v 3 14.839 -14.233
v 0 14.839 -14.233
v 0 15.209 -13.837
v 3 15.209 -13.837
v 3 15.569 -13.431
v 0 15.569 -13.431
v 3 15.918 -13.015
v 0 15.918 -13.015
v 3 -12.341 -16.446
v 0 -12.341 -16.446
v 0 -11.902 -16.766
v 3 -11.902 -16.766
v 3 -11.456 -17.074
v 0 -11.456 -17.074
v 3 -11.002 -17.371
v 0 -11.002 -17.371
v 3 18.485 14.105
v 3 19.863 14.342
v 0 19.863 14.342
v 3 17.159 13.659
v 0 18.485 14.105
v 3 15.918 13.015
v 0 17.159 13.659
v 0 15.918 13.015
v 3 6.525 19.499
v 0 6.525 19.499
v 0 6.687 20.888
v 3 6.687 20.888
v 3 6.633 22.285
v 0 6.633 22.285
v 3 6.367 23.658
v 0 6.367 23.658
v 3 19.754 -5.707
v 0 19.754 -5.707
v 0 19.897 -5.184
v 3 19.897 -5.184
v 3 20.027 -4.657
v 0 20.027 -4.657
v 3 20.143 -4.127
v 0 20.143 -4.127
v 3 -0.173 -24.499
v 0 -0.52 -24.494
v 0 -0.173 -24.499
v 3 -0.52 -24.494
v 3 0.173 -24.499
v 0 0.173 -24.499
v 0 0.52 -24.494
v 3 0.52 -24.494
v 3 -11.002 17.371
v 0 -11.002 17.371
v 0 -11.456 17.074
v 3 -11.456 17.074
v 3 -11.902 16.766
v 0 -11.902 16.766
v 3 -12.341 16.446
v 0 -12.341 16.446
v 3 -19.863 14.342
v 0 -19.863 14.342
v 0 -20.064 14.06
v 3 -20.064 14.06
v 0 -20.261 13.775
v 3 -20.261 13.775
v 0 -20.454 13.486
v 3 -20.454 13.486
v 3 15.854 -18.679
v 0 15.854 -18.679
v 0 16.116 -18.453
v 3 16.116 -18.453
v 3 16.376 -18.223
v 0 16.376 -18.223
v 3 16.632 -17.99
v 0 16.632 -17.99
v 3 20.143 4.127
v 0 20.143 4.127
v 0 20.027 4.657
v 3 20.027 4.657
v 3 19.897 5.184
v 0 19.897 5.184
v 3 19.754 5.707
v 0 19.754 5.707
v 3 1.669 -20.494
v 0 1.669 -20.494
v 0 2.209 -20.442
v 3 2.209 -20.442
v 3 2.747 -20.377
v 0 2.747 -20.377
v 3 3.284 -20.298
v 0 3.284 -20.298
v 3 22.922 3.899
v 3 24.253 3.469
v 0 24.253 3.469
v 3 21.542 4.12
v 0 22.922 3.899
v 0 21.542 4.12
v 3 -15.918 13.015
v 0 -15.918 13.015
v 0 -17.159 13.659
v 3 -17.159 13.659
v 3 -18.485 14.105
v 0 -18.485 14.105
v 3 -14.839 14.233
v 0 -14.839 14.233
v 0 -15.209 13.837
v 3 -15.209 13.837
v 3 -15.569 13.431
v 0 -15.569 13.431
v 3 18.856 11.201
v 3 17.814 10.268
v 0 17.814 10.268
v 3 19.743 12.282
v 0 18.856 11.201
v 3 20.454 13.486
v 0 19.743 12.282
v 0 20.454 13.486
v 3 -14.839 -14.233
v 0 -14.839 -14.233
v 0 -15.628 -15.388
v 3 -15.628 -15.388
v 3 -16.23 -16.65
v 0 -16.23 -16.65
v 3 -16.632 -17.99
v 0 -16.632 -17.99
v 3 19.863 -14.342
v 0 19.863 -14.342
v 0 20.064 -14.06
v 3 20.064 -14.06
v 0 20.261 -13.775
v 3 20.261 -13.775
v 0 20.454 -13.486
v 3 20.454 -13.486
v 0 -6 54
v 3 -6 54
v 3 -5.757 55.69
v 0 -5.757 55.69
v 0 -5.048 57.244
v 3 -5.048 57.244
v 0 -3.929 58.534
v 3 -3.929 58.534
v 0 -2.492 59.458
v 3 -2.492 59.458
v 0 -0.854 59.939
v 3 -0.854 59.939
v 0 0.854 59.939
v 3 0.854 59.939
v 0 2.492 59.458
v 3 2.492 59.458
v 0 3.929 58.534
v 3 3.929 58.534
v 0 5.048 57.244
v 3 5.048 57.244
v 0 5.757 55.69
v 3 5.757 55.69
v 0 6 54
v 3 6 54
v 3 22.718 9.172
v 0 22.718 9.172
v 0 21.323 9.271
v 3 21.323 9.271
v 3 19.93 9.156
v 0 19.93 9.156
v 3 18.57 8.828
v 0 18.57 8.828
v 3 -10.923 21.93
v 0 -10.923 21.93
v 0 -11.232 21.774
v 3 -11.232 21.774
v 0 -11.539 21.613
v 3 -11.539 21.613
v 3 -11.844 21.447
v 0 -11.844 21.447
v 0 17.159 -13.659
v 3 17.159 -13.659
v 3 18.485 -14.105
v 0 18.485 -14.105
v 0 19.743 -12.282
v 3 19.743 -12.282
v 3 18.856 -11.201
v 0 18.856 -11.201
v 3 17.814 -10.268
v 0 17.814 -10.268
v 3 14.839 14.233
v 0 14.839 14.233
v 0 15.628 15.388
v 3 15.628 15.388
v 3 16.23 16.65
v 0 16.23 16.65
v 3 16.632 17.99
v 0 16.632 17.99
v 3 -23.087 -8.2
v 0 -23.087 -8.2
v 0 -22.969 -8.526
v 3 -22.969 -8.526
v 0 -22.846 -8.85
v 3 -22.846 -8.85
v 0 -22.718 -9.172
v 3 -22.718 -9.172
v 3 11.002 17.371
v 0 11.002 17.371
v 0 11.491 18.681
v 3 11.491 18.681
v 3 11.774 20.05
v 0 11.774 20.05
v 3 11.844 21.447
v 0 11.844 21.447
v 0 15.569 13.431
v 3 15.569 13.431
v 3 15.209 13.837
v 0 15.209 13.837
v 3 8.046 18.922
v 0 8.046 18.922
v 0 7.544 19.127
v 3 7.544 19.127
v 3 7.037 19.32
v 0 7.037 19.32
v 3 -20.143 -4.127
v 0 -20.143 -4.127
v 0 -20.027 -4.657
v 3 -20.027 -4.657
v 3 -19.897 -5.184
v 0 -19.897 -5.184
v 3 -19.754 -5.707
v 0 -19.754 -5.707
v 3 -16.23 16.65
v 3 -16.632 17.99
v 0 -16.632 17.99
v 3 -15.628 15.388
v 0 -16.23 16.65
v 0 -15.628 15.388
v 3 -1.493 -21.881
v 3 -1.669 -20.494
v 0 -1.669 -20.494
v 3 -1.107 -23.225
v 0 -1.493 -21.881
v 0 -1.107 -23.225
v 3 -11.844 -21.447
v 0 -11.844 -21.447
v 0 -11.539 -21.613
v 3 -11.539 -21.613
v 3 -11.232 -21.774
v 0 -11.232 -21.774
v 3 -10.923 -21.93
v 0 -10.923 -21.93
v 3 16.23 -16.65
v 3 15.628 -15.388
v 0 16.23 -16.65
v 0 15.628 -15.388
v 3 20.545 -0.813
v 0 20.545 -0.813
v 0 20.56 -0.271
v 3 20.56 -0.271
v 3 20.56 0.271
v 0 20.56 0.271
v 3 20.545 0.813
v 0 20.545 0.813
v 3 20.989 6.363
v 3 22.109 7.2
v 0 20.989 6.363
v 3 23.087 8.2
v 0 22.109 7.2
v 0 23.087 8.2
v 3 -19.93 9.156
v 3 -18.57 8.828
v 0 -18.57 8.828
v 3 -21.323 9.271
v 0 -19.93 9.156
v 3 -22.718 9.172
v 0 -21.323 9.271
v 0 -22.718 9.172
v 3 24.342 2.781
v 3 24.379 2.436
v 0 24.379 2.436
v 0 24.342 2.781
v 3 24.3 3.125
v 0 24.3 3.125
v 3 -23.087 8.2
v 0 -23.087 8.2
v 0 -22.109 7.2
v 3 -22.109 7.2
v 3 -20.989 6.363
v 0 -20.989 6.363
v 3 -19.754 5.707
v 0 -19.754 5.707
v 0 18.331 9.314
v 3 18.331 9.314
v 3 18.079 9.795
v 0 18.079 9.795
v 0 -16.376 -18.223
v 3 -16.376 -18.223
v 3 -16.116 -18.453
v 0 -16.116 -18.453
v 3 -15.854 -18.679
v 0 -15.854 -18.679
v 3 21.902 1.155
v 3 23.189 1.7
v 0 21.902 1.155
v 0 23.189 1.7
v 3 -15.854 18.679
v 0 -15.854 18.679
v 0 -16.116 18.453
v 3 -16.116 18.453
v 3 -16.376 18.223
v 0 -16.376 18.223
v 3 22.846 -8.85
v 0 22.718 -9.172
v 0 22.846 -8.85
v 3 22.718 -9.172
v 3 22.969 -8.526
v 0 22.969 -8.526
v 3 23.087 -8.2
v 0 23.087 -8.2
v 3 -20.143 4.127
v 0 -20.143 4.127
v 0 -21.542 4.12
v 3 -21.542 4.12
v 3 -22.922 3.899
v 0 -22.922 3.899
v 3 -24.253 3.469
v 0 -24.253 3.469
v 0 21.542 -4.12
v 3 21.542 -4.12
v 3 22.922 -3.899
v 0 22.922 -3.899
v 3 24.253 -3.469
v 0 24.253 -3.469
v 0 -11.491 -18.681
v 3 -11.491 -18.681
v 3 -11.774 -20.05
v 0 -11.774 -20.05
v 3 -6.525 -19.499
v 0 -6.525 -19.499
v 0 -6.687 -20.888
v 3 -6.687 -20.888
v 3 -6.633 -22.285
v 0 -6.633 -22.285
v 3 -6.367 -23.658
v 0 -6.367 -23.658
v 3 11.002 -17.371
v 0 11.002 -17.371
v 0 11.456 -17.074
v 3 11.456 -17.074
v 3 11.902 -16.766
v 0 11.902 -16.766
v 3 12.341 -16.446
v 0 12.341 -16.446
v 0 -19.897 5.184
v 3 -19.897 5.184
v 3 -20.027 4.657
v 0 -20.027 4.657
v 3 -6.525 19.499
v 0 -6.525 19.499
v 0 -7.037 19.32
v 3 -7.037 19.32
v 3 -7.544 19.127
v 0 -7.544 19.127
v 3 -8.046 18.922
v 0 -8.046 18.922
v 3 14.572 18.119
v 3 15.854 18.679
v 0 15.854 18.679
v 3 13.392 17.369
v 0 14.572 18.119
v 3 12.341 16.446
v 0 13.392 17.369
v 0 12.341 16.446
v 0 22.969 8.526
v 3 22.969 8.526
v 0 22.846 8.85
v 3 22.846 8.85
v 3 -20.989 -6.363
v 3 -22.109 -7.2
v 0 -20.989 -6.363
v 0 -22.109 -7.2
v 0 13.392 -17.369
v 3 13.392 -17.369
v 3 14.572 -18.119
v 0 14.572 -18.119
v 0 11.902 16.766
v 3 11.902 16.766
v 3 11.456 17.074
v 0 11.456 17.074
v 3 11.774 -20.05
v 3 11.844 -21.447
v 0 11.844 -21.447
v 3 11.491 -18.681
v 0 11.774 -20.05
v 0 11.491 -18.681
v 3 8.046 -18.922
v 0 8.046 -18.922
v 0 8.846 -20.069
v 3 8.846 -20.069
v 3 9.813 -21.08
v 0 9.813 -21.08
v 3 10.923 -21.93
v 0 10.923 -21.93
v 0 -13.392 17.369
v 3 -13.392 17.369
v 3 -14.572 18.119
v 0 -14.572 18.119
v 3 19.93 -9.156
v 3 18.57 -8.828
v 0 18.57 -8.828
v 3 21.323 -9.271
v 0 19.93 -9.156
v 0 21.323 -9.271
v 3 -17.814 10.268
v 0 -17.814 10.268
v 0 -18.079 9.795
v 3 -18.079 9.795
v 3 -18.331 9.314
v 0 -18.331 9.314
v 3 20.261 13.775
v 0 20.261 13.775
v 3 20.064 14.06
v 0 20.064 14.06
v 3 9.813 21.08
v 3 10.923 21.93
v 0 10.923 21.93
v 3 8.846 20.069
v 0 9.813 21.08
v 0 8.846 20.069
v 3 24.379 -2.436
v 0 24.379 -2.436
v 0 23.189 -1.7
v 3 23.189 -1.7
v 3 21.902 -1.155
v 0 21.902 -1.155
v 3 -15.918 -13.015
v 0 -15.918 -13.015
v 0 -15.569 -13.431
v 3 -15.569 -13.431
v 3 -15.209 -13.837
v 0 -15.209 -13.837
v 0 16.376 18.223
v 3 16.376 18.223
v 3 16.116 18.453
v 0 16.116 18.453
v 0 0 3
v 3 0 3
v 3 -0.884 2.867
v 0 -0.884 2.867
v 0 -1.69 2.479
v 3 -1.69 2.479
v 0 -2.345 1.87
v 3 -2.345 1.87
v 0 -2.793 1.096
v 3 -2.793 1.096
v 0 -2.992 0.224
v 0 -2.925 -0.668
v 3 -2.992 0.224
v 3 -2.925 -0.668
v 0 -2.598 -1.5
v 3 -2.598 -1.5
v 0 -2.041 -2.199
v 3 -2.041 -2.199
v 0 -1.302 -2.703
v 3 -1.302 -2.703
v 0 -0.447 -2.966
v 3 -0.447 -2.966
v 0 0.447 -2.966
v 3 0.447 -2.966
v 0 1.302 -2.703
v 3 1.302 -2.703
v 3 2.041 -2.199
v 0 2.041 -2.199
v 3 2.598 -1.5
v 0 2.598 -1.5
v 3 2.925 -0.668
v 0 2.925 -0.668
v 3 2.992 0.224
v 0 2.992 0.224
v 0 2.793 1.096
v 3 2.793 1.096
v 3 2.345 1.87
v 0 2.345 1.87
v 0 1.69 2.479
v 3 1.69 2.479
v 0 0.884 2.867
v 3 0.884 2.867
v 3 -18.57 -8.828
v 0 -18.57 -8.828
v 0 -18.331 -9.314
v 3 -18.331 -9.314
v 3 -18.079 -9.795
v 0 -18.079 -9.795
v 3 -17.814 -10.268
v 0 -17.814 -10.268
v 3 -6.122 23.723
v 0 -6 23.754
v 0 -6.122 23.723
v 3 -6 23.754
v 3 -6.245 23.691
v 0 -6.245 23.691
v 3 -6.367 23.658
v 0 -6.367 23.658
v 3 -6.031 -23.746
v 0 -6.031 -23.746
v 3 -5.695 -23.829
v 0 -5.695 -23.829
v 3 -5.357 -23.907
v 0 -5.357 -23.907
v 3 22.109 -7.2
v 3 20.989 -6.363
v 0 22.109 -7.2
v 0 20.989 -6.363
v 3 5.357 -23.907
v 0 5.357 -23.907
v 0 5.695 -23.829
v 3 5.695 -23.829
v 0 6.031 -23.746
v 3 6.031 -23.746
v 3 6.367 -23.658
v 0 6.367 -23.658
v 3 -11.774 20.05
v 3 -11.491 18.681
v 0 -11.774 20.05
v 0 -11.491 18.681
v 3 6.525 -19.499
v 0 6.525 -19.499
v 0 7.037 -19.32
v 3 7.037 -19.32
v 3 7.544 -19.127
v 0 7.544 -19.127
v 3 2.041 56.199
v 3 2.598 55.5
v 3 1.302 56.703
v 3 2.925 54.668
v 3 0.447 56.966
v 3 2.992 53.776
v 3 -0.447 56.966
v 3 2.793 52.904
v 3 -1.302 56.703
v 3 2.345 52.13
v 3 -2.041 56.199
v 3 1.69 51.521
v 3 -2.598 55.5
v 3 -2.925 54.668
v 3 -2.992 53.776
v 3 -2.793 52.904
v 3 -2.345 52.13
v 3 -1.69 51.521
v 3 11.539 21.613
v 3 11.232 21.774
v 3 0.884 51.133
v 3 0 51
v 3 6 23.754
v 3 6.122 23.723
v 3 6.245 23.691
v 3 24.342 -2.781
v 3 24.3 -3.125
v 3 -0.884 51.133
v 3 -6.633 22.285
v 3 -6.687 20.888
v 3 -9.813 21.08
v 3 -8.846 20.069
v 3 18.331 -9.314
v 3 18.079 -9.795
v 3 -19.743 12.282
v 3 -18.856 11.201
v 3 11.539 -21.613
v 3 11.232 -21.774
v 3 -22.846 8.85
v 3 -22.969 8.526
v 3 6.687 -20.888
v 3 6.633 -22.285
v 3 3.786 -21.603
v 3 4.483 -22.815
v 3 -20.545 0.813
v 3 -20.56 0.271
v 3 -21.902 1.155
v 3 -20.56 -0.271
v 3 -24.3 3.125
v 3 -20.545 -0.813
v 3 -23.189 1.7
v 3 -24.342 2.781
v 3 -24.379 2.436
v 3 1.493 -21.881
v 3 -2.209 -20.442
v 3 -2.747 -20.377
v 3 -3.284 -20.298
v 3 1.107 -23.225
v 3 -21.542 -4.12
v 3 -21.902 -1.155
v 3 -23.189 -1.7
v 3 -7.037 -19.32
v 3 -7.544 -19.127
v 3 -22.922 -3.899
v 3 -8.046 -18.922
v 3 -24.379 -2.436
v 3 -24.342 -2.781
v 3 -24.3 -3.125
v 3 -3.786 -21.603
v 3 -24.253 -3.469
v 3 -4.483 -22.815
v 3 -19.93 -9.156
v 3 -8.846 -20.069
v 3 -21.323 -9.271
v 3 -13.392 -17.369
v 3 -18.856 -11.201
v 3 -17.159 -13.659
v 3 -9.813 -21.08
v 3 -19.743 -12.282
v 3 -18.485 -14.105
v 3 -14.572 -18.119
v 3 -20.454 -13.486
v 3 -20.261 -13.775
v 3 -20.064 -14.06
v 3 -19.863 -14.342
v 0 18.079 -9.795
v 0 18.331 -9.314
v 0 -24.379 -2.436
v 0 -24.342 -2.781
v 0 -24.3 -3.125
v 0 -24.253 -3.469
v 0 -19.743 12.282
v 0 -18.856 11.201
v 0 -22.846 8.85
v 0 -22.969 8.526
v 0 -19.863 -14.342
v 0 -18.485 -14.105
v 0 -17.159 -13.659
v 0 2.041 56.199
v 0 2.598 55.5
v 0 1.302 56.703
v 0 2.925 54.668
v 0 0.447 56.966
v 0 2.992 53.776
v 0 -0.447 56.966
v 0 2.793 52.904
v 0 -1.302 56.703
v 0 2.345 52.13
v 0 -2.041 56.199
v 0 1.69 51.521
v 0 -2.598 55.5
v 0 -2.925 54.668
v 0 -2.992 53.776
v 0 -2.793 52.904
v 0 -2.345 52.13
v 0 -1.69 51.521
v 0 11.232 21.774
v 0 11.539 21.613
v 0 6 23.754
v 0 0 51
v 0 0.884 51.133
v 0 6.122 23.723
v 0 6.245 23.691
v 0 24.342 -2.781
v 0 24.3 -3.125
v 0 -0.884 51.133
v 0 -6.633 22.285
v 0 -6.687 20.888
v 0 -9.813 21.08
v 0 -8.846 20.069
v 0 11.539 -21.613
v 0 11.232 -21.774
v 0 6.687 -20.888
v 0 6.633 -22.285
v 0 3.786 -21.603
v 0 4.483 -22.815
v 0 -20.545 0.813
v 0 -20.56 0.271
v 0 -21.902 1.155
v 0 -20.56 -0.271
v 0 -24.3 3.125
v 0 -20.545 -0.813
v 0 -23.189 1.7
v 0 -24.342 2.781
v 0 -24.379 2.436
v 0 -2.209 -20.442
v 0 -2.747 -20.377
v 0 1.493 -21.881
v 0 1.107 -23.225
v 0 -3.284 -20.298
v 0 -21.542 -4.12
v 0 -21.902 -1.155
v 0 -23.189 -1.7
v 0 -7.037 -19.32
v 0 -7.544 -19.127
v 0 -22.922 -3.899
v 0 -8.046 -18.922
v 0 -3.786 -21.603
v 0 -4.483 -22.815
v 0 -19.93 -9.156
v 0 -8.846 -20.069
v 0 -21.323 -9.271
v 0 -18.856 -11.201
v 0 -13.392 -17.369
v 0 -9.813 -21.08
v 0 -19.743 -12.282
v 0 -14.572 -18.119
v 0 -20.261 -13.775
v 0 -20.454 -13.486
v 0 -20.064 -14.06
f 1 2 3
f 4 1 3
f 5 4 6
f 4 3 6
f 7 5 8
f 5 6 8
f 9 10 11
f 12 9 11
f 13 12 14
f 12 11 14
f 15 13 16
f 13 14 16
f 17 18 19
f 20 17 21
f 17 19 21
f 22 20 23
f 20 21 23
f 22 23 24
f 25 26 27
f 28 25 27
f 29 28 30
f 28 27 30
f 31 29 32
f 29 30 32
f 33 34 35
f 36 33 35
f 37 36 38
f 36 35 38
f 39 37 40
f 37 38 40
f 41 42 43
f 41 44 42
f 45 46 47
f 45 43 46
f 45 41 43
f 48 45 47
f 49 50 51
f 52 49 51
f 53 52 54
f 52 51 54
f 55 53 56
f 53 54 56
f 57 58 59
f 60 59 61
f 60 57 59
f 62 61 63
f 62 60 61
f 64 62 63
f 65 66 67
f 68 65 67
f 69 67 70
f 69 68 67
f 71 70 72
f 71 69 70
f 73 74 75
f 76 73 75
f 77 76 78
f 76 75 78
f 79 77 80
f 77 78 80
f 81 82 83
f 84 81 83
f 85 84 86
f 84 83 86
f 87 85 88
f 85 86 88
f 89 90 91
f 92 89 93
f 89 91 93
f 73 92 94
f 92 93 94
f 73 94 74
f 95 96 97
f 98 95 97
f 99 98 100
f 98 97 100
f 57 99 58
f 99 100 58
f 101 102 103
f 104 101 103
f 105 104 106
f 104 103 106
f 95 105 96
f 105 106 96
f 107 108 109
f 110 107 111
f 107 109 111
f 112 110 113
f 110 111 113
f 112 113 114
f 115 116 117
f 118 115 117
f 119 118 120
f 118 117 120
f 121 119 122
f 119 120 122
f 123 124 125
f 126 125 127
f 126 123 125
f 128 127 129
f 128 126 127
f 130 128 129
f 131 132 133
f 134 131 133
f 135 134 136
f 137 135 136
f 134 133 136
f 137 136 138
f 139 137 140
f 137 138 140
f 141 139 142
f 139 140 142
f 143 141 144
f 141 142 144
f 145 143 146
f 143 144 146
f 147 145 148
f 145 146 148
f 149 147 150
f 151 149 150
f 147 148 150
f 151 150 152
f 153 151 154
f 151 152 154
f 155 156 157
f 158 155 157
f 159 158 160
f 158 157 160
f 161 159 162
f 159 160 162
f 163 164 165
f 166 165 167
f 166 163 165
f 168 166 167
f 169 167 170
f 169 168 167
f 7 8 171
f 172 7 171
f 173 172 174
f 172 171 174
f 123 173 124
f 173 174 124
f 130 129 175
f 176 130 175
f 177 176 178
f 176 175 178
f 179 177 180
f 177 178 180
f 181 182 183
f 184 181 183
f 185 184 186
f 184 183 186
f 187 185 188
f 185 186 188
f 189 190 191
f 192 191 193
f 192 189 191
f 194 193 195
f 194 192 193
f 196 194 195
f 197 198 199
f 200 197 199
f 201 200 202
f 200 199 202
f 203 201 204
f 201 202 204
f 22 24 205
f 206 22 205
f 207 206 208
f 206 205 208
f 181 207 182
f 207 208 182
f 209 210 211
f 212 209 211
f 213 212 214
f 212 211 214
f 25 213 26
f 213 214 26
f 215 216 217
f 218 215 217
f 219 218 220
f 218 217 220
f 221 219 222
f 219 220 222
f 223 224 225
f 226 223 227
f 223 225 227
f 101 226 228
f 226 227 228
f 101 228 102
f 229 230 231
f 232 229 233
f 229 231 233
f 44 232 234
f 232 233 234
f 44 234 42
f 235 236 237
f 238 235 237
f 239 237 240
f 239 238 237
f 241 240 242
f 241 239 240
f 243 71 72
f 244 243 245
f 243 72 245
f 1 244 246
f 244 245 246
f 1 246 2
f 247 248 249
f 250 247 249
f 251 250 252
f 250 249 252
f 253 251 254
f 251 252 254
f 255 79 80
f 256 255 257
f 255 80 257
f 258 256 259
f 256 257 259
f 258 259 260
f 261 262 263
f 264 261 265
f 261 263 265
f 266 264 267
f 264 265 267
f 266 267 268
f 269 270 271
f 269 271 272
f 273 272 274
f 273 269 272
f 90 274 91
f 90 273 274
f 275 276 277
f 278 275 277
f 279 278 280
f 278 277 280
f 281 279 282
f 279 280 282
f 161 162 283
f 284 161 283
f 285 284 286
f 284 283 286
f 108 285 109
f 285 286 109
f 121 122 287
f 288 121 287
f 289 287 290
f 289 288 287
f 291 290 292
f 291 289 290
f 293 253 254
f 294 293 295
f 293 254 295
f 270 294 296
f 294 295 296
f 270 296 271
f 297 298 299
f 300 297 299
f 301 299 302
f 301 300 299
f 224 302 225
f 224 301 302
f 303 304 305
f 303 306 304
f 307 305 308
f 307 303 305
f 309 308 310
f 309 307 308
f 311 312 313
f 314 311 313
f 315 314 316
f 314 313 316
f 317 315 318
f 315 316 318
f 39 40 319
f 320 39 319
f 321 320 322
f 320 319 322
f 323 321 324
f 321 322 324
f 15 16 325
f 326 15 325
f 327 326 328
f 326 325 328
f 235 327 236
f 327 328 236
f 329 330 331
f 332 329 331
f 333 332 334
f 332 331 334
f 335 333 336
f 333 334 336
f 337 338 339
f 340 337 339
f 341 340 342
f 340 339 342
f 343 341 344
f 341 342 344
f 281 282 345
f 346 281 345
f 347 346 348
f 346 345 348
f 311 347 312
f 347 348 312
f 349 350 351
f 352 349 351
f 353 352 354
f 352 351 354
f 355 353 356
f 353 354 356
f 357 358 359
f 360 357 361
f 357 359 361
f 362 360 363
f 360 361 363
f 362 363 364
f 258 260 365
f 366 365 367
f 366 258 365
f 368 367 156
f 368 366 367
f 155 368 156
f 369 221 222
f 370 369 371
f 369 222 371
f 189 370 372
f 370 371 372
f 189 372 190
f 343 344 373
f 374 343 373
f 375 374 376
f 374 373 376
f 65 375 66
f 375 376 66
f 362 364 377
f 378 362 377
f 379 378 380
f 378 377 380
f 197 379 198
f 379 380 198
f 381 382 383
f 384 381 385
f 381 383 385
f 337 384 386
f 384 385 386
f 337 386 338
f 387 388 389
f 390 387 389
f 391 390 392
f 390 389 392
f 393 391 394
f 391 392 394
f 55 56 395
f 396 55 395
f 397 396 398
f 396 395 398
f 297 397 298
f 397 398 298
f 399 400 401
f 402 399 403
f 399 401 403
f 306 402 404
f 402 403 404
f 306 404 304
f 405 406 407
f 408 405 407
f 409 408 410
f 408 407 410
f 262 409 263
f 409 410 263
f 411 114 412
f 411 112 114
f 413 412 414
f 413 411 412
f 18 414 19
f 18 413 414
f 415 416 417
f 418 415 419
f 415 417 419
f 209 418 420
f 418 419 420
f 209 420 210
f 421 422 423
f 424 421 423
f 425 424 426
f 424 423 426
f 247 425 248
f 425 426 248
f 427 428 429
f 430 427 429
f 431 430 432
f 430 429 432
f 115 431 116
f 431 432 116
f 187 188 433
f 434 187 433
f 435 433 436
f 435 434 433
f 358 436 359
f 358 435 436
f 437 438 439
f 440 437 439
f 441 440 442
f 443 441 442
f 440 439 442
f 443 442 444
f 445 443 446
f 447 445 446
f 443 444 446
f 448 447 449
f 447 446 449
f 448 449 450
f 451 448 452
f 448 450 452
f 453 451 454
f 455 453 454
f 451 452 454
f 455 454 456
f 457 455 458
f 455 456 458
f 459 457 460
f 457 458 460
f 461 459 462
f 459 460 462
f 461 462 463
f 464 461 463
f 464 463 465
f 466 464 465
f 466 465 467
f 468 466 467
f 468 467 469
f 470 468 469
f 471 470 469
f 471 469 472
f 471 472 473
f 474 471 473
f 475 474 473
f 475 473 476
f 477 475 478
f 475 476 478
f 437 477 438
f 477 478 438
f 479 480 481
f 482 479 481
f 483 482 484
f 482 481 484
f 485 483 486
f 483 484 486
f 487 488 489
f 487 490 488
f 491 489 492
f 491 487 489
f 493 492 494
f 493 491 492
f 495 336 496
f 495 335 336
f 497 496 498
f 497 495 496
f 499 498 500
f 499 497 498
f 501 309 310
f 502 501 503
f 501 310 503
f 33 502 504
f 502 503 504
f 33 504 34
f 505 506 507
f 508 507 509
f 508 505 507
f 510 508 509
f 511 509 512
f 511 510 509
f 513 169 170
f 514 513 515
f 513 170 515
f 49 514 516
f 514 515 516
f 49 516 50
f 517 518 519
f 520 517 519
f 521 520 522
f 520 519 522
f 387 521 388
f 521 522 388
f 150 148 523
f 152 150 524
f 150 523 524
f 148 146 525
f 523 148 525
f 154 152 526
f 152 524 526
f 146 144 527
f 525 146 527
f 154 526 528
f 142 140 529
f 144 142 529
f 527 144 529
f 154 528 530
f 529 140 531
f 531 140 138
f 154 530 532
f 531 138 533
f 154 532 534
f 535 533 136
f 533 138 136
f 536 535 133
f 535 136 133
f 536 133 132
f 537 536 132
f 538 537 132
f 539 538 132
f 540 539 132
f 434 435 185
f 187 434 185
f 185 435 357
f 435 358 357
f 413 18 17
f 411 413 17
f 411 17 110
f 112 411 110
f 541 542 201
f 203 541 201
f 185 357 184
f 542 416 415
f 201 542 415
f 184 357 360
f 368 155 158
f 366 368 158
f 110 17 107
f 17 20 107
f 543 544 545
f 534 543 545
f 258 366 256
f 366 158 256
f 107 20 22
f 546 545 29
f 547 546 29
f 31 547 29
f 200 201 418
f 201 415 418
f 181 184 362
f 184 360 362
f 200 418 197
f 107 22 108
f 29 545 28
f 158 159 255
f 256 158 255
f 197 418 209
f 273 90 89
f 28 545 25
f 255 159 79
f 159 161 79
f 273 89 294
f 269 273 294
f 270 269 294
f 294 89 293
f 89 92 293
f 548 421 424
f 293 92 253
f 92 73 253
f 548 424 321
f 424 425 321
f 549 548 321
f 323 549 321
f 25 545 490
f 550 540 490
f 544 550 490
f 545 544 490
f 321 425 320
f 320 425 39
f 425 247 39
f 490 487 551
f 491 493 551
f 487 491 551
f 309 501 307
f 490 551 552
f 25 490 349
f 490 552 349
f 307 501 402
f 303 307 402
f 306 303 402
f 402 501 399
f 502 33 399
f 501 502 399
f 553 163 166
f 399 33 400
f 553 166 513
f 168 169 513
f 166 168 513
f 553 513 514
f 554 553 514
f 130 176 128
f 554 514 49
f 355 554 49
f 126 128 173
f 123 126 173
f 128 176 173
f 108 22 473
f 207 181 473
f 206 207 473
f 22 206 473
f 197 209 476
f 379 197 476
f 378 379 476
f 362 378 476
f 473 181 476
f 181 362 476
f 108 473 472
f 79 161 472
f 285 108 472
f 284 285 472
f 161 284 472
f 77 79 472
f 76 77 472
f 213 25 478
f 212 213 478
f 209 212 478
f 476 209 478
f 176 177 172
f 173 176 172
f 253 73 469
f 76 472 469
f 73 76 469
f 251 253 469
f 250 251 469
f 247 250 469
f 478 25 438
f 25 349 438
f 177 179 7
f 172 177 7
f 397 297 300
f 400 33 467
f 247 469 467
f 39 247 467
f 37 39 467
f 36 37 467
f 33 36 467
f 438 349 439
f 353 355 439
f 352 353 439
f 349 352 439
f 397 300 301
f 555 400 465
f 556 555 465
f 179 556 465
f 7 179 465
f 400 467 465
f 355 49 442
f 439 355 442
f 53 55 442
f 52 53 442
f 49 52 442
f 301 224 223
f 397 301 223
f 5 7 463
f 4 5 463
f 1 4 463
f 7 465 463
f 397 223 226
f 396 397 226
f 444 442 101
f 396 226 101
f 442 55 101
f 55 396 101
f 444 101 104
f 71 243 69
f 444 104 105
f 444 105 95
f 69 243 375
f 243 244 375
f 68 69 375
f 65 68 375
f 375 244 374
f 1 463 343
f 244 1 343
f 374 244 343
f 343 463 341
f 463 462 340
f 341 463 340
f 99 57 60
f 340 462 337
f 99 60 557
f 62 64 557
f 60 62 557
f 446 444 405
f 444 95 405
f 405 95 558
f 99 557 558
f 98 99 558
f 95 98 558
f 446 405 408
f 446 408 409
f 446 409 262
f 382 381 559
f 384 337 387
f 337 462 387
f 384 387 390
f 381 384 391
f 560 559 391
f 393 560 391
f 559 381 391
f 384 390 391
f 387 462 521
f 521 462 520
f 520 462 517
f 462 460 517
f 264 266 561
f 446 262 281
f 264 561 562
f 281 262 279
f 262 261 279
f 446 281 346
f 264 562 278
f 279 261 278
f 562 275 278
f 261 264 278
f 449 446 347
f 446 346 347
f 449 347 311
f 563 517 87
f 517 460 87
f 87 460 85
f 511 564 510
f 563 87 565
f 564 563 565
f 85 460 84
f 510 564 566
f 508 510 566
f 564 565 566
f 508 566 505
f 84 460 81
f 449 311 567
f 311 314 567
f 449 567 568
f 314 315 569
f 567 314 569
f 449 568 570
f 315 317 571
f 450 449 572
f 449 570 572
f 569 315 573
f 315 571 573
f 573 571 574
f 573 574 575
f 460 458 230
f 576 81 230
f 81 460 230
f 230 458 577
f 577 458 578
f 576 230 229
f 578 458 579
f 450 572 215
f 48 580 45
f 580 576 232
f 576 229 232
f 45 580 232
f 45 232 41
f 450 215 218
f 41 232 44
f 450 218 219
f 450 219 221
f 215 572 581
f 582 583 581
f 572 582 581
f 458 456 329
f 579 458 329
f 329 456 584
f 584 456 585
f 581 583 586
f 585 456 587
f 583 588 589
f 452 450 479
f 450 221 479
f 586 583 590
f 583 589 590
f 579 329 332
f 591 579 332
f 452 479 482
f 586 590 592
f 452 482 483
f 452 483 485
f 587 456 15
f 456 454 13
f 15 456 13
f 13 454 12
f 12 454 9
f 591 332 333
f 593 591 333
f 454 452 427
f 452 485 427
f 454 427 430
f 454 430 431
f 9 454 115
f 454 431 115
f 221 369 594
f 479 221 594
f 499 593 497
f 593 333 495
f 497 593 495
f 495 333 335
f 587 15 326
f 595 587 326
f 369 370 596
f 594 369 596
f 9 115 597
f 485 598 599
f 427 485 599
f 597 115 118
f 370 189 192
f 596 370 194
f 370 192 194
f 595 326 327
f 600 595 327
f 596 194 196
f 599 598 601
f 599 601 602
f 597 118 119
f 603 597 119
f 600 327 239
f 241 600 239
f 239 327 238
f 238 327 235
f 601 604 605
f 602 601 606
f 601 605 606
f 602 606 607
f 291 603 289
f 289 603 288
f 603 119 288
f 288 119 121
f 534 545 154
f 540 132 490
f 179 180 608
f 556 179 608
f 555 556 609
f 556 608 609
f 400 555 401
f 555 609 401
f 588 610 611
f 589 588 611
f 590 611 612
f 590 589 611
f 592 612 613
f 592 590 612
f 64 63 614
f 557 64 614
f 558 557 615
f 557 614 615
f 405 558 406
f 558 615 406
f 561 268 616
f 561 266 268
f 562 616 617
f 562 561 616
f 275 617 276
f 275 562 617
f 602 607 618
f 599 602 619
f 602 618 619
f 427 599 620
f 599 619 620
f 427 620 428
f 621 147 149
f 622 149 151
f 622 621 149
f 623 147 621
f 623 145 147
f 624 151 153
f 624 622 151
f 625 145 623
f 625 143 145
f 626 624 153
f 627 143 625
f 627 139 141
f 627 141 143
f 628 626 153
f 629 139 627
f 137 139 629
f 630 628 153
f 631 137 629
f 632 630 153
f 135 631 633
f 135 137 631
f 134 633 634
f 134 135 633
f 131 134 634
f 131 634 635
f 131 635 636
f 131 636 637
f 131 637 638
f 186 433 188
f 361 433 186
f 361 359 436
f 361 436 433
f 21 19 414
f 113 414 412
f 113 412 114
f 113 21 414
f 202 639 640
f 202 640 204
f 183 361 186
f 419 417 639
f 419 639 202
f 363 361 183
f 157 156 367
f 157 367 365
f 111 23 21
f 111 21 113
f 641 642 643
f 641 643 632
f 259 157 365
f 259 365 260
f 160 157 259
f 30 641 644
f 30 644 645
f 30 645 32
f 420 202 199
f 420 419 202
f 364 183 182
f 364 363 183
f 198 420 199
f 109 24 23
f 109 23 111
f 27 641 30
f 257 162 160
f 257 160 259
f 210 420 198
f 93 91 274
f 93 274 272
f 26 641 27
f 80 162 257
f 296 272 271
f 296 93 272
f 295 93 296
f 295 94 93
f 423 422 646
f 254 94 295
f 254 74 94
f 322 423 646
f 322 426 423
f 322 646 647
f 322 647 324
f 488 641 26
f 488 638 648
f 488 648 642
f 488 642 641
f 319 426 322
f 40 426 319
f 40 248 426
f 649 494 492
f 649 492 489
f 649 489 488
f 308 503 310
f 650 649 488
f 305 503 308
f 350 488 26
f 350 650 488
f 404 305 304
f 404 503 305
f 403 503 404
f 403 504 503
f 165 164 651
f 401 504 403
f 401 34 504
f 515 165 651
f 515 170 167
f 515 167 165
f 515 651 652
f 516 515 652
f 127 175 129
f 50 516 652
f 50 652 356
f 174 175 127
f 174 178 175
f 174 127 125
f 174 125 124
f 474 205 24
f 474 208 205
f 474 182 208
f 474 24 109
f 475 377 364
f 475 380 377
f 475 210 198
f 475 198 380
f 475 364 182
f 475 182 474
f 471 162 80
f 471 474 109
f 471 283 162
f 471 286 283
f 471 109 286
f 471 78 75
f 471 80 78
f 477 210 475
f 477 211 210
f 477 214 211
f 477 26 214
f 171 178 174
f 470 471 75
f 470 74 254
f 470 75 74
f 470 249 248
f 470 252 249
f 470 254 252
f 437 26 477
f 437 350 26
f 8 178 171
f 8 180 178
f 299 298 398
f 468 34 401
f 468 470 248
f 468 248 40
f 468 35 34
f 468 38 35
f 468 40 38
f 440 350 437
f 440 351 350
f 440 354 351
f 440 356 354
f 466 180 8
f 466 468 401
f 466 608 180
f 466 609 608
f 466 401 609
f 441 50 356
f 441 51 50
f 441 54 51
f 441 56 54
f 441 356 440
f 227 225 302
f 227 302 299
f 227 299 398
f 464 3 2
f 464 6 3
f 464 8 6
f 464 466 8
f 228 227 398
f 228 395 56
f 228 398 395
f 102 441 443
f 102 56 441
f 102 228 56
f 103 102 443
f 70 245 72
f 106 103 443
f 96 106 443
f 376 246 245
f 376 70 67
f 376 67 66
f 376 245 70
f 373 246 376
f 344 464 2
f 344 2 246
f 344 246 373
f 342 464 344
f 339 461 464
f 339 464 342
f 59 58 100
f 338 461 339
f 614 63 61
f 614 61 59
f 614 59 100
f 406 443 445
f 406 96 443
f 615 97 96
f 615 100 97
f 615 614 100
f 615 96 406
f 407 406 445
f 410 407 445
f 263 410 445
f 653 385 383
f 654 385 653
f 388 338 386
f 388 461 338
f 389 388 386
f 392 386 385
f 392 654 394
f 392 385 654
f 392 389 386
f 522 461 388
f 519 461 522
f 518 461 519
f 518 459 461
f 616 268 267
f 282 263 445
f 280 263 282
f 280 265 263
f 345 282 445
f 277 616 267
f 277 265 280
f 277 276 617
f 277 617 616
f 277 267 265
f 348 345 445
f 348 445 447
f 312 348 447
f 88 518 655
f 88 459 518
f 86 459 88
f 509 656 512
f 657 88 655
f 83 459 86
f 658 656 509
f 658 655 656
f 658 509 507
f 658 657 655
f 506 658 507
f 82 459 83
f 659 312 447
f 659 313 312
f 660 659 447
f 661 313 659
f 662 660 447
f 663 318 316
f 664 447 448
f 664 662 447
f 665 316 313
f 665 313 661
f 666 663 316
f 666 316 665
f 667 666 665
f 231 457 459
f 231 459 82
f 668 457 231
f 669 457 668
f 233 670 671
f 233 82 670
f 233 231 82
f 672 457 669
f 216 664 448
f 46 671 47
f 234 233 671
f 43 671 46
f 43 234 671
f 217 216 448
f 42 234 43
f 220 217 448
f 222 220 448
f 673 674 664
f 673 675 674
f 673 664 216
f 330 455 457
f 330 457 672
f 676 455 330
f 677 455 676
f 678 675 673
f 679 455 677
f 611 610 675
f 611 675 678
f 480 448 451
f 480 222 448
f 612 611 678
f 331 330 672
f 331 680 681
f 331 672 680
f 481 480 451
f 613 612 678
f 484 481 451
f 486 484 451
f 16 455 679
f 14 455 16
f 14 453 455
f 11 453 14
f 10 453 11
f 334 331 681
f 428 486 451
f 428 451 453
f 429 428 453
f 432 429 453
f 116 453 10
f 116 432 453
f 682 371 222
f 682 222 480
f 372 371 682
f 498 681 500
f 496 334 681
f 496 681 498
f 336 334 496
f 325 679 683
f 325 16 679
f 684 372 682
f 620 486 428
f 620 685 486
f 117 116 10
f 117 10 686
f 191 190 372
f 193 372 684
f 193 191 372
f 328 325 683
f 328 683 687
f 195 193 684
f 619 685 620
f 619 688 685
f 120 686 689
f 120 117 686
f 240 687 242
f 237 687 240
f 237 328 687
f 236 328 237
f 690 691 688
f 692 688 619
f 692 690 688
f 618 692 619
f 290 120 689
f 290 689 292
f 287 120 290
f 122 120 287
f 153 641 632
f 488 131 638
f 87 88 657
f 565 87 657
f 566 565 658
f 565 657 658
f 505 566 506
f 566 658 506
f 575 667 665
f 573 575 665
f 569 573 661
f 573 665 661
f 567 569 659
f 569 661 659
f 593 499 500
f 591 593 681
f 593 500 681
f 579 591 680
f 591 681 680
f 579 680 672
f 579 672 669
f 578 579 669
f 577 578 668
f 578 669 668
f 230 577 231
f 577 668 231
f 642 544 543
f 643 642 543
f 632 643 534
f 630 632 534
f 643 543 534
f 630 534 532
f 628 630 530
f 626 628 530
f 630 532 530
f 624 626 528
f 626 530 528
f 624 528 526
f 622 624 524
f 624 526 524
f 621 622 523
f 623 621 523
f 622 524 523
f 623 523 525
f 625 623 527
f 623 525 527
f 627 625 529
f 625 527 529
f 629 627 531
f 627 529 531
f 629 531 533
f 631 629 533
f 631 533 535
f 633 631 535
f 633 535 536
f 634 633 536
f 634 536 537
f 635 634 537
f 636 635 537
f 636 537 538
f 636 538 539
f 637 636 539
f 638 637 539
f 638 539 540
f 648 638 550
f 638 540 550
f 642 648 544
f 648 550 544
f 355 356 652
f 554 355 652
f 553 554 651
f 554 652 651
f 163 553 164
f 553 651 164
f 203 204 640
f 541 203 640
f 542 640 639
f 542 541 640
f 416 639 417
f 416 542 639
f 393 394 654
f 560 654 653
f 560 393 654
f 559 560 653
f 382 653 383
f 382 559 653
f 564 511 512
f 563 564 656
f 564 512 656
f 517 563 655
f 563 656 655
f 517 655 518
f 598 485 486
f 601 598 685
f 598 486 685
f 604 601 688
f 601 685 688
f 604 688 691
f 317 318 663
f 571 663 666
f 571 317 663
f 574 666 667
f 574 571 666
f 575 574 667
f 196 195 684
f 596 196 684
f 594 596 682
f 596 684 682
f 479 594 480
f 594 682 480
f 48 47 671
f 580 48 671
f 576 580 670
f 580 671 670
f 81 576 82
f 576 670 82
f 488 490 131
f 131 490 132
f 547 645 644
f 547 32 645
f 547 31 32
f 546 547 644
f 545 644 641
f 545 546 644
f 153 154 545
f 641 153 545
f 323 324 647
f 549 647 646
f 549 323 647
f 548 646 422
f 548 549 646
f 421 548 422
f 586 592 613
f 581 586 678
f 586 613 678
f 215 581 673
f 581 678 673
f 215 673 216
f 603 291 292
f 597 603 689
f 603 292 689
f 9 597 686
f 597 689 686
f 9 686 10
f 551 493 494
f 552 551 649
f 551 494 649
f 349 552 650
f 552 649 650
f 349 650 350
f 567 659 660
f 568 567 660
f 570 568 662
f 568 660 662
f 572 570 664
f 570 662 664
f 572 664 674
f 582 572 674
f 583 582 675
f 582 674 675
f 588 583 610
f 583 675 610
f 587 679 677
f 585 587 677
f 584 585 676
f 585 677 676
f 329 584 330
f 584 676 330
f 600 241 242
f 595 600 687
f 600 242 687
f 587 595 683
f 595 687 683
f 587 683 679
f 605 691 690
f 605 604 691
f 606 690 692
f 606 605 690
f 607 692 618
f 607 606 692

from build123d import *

# Parameters (mm, degrees)
BASPROSKE_W         = 3
BASPROSKE_H         = 24.5
TOOTHCUT_DEPTH      = 35.777866525
TEETHCUTS_COUNT     = 26
TEETHCUTS_ANGLE     = 346.153846154
BORSKE_R            = 3
BORE_DEPTH          = 50.0000508
BOSS_EXTRUDE1_START = 3
SKETCH2_R           = 3
BOSS_EXTRUDE1_DEPTH = 3


with BuildPart() as part:
    # BasProSke → Base-Revolve (revolve)
    with BuildSketch(Plane(origin=(0, 0, 0), x_dir=(1, 0, 0), z_dir=(0, 1, 0)), mode=Mode.PRIVATE) as base_revolve_sk:
        with Locations((1.5, 12.25)):
            Rectangle(BASPROSKE_W, BASPROSKE_H)
    revolve(base_revolve_sk.sketch.rotate(Axis((-10, 0, 0), (1, 0, 0)), 180), axis=Axis((-10, 0, 0), (1, 0, 0)))

    # TooCutSke → ToothCut (cut, through all)
    with BuildSketch(Plane(origin=(0, 0, 0), x_dir=(0, 0, -1), z_dir=(1, 0, 0))):
        with BuildLine():
            ThreePointArc((0.813448928, 20.545402967), (0, 20.5615), (-0.813448928, 20.545402967))
            ThreePointArc((-0.813448928, 20.545402967), (-1.408477569, 22.569593712), (-2.4536582, 24.402352481))
            ThreePointArc((-2.4536582, 24.402352481), (0, 24.5254), (2.4536582, 24.402352481))
            ThreePointArc((2.4536582, 24.402352481), (1.408477569, 22.569593712), (0.813448928, 20.545402967))
        make_face()
    toothcut = extrude(amount=TOOTHCUT_DEPTH, mode=Mode.SUBTRACT)

    # TeethCuts: ToothCut ×26 about axis
    teethcuts_axis = Axis((-10, 0, 0), (1, 0, 0))
    for i in range(1, TEETHCUTS_COUNT):
        add(toothcut.rotate(teethcuts_axis, i * TEETHCUTS_ANGLE / (TEETHCUTS_COUNT - 1)), mode=Mode.SUBTRACT)

    # BorSke → Bore (cut, symmetric)
    with BuildSketch(Plane(origin=(0, 0, 0), x_dir=(0, 0, -1), z_dir=(1, 0, 0))):
        with Locations(Location((0, 0, 0), (0, 0, 180))):
            Circle(BORSKE_R)
    extrude(amount=BORE_DEPTH, both=True, mode=Mode.SUBTRACT)

    # Sketch2 → Boss-Extrude1 (add)
    with BuildSketch(Plane(origin=(0, 0, 0), x_dir=(0, 0, -1), z_dir=(1, 0, 0)).offset(BOSS_EXTRUDE1_START)):
        with BuildLine():
            Line((0, -6), (-54, -6))
            ThreePointArc((-54, -6), (-60, 0), (-54, 6))
            Line((-54, 6), (0, 6))
            ThreePointArc((0, 6), (6, 0), (0, -6))
        make_face()
        with Locations((-54, 0)):
            Circle(SKETCH2_R, mode=Mode.SUBTRACT)
        with Locations(Location((0, 0, 0), (0, 0, 180))):
            Circle(SKETCH2_R, mode=Mode.SUBTRACT)
    extrude(amount=-BOSS_EXTRUDE1_DEPTH)


solid = part.part
